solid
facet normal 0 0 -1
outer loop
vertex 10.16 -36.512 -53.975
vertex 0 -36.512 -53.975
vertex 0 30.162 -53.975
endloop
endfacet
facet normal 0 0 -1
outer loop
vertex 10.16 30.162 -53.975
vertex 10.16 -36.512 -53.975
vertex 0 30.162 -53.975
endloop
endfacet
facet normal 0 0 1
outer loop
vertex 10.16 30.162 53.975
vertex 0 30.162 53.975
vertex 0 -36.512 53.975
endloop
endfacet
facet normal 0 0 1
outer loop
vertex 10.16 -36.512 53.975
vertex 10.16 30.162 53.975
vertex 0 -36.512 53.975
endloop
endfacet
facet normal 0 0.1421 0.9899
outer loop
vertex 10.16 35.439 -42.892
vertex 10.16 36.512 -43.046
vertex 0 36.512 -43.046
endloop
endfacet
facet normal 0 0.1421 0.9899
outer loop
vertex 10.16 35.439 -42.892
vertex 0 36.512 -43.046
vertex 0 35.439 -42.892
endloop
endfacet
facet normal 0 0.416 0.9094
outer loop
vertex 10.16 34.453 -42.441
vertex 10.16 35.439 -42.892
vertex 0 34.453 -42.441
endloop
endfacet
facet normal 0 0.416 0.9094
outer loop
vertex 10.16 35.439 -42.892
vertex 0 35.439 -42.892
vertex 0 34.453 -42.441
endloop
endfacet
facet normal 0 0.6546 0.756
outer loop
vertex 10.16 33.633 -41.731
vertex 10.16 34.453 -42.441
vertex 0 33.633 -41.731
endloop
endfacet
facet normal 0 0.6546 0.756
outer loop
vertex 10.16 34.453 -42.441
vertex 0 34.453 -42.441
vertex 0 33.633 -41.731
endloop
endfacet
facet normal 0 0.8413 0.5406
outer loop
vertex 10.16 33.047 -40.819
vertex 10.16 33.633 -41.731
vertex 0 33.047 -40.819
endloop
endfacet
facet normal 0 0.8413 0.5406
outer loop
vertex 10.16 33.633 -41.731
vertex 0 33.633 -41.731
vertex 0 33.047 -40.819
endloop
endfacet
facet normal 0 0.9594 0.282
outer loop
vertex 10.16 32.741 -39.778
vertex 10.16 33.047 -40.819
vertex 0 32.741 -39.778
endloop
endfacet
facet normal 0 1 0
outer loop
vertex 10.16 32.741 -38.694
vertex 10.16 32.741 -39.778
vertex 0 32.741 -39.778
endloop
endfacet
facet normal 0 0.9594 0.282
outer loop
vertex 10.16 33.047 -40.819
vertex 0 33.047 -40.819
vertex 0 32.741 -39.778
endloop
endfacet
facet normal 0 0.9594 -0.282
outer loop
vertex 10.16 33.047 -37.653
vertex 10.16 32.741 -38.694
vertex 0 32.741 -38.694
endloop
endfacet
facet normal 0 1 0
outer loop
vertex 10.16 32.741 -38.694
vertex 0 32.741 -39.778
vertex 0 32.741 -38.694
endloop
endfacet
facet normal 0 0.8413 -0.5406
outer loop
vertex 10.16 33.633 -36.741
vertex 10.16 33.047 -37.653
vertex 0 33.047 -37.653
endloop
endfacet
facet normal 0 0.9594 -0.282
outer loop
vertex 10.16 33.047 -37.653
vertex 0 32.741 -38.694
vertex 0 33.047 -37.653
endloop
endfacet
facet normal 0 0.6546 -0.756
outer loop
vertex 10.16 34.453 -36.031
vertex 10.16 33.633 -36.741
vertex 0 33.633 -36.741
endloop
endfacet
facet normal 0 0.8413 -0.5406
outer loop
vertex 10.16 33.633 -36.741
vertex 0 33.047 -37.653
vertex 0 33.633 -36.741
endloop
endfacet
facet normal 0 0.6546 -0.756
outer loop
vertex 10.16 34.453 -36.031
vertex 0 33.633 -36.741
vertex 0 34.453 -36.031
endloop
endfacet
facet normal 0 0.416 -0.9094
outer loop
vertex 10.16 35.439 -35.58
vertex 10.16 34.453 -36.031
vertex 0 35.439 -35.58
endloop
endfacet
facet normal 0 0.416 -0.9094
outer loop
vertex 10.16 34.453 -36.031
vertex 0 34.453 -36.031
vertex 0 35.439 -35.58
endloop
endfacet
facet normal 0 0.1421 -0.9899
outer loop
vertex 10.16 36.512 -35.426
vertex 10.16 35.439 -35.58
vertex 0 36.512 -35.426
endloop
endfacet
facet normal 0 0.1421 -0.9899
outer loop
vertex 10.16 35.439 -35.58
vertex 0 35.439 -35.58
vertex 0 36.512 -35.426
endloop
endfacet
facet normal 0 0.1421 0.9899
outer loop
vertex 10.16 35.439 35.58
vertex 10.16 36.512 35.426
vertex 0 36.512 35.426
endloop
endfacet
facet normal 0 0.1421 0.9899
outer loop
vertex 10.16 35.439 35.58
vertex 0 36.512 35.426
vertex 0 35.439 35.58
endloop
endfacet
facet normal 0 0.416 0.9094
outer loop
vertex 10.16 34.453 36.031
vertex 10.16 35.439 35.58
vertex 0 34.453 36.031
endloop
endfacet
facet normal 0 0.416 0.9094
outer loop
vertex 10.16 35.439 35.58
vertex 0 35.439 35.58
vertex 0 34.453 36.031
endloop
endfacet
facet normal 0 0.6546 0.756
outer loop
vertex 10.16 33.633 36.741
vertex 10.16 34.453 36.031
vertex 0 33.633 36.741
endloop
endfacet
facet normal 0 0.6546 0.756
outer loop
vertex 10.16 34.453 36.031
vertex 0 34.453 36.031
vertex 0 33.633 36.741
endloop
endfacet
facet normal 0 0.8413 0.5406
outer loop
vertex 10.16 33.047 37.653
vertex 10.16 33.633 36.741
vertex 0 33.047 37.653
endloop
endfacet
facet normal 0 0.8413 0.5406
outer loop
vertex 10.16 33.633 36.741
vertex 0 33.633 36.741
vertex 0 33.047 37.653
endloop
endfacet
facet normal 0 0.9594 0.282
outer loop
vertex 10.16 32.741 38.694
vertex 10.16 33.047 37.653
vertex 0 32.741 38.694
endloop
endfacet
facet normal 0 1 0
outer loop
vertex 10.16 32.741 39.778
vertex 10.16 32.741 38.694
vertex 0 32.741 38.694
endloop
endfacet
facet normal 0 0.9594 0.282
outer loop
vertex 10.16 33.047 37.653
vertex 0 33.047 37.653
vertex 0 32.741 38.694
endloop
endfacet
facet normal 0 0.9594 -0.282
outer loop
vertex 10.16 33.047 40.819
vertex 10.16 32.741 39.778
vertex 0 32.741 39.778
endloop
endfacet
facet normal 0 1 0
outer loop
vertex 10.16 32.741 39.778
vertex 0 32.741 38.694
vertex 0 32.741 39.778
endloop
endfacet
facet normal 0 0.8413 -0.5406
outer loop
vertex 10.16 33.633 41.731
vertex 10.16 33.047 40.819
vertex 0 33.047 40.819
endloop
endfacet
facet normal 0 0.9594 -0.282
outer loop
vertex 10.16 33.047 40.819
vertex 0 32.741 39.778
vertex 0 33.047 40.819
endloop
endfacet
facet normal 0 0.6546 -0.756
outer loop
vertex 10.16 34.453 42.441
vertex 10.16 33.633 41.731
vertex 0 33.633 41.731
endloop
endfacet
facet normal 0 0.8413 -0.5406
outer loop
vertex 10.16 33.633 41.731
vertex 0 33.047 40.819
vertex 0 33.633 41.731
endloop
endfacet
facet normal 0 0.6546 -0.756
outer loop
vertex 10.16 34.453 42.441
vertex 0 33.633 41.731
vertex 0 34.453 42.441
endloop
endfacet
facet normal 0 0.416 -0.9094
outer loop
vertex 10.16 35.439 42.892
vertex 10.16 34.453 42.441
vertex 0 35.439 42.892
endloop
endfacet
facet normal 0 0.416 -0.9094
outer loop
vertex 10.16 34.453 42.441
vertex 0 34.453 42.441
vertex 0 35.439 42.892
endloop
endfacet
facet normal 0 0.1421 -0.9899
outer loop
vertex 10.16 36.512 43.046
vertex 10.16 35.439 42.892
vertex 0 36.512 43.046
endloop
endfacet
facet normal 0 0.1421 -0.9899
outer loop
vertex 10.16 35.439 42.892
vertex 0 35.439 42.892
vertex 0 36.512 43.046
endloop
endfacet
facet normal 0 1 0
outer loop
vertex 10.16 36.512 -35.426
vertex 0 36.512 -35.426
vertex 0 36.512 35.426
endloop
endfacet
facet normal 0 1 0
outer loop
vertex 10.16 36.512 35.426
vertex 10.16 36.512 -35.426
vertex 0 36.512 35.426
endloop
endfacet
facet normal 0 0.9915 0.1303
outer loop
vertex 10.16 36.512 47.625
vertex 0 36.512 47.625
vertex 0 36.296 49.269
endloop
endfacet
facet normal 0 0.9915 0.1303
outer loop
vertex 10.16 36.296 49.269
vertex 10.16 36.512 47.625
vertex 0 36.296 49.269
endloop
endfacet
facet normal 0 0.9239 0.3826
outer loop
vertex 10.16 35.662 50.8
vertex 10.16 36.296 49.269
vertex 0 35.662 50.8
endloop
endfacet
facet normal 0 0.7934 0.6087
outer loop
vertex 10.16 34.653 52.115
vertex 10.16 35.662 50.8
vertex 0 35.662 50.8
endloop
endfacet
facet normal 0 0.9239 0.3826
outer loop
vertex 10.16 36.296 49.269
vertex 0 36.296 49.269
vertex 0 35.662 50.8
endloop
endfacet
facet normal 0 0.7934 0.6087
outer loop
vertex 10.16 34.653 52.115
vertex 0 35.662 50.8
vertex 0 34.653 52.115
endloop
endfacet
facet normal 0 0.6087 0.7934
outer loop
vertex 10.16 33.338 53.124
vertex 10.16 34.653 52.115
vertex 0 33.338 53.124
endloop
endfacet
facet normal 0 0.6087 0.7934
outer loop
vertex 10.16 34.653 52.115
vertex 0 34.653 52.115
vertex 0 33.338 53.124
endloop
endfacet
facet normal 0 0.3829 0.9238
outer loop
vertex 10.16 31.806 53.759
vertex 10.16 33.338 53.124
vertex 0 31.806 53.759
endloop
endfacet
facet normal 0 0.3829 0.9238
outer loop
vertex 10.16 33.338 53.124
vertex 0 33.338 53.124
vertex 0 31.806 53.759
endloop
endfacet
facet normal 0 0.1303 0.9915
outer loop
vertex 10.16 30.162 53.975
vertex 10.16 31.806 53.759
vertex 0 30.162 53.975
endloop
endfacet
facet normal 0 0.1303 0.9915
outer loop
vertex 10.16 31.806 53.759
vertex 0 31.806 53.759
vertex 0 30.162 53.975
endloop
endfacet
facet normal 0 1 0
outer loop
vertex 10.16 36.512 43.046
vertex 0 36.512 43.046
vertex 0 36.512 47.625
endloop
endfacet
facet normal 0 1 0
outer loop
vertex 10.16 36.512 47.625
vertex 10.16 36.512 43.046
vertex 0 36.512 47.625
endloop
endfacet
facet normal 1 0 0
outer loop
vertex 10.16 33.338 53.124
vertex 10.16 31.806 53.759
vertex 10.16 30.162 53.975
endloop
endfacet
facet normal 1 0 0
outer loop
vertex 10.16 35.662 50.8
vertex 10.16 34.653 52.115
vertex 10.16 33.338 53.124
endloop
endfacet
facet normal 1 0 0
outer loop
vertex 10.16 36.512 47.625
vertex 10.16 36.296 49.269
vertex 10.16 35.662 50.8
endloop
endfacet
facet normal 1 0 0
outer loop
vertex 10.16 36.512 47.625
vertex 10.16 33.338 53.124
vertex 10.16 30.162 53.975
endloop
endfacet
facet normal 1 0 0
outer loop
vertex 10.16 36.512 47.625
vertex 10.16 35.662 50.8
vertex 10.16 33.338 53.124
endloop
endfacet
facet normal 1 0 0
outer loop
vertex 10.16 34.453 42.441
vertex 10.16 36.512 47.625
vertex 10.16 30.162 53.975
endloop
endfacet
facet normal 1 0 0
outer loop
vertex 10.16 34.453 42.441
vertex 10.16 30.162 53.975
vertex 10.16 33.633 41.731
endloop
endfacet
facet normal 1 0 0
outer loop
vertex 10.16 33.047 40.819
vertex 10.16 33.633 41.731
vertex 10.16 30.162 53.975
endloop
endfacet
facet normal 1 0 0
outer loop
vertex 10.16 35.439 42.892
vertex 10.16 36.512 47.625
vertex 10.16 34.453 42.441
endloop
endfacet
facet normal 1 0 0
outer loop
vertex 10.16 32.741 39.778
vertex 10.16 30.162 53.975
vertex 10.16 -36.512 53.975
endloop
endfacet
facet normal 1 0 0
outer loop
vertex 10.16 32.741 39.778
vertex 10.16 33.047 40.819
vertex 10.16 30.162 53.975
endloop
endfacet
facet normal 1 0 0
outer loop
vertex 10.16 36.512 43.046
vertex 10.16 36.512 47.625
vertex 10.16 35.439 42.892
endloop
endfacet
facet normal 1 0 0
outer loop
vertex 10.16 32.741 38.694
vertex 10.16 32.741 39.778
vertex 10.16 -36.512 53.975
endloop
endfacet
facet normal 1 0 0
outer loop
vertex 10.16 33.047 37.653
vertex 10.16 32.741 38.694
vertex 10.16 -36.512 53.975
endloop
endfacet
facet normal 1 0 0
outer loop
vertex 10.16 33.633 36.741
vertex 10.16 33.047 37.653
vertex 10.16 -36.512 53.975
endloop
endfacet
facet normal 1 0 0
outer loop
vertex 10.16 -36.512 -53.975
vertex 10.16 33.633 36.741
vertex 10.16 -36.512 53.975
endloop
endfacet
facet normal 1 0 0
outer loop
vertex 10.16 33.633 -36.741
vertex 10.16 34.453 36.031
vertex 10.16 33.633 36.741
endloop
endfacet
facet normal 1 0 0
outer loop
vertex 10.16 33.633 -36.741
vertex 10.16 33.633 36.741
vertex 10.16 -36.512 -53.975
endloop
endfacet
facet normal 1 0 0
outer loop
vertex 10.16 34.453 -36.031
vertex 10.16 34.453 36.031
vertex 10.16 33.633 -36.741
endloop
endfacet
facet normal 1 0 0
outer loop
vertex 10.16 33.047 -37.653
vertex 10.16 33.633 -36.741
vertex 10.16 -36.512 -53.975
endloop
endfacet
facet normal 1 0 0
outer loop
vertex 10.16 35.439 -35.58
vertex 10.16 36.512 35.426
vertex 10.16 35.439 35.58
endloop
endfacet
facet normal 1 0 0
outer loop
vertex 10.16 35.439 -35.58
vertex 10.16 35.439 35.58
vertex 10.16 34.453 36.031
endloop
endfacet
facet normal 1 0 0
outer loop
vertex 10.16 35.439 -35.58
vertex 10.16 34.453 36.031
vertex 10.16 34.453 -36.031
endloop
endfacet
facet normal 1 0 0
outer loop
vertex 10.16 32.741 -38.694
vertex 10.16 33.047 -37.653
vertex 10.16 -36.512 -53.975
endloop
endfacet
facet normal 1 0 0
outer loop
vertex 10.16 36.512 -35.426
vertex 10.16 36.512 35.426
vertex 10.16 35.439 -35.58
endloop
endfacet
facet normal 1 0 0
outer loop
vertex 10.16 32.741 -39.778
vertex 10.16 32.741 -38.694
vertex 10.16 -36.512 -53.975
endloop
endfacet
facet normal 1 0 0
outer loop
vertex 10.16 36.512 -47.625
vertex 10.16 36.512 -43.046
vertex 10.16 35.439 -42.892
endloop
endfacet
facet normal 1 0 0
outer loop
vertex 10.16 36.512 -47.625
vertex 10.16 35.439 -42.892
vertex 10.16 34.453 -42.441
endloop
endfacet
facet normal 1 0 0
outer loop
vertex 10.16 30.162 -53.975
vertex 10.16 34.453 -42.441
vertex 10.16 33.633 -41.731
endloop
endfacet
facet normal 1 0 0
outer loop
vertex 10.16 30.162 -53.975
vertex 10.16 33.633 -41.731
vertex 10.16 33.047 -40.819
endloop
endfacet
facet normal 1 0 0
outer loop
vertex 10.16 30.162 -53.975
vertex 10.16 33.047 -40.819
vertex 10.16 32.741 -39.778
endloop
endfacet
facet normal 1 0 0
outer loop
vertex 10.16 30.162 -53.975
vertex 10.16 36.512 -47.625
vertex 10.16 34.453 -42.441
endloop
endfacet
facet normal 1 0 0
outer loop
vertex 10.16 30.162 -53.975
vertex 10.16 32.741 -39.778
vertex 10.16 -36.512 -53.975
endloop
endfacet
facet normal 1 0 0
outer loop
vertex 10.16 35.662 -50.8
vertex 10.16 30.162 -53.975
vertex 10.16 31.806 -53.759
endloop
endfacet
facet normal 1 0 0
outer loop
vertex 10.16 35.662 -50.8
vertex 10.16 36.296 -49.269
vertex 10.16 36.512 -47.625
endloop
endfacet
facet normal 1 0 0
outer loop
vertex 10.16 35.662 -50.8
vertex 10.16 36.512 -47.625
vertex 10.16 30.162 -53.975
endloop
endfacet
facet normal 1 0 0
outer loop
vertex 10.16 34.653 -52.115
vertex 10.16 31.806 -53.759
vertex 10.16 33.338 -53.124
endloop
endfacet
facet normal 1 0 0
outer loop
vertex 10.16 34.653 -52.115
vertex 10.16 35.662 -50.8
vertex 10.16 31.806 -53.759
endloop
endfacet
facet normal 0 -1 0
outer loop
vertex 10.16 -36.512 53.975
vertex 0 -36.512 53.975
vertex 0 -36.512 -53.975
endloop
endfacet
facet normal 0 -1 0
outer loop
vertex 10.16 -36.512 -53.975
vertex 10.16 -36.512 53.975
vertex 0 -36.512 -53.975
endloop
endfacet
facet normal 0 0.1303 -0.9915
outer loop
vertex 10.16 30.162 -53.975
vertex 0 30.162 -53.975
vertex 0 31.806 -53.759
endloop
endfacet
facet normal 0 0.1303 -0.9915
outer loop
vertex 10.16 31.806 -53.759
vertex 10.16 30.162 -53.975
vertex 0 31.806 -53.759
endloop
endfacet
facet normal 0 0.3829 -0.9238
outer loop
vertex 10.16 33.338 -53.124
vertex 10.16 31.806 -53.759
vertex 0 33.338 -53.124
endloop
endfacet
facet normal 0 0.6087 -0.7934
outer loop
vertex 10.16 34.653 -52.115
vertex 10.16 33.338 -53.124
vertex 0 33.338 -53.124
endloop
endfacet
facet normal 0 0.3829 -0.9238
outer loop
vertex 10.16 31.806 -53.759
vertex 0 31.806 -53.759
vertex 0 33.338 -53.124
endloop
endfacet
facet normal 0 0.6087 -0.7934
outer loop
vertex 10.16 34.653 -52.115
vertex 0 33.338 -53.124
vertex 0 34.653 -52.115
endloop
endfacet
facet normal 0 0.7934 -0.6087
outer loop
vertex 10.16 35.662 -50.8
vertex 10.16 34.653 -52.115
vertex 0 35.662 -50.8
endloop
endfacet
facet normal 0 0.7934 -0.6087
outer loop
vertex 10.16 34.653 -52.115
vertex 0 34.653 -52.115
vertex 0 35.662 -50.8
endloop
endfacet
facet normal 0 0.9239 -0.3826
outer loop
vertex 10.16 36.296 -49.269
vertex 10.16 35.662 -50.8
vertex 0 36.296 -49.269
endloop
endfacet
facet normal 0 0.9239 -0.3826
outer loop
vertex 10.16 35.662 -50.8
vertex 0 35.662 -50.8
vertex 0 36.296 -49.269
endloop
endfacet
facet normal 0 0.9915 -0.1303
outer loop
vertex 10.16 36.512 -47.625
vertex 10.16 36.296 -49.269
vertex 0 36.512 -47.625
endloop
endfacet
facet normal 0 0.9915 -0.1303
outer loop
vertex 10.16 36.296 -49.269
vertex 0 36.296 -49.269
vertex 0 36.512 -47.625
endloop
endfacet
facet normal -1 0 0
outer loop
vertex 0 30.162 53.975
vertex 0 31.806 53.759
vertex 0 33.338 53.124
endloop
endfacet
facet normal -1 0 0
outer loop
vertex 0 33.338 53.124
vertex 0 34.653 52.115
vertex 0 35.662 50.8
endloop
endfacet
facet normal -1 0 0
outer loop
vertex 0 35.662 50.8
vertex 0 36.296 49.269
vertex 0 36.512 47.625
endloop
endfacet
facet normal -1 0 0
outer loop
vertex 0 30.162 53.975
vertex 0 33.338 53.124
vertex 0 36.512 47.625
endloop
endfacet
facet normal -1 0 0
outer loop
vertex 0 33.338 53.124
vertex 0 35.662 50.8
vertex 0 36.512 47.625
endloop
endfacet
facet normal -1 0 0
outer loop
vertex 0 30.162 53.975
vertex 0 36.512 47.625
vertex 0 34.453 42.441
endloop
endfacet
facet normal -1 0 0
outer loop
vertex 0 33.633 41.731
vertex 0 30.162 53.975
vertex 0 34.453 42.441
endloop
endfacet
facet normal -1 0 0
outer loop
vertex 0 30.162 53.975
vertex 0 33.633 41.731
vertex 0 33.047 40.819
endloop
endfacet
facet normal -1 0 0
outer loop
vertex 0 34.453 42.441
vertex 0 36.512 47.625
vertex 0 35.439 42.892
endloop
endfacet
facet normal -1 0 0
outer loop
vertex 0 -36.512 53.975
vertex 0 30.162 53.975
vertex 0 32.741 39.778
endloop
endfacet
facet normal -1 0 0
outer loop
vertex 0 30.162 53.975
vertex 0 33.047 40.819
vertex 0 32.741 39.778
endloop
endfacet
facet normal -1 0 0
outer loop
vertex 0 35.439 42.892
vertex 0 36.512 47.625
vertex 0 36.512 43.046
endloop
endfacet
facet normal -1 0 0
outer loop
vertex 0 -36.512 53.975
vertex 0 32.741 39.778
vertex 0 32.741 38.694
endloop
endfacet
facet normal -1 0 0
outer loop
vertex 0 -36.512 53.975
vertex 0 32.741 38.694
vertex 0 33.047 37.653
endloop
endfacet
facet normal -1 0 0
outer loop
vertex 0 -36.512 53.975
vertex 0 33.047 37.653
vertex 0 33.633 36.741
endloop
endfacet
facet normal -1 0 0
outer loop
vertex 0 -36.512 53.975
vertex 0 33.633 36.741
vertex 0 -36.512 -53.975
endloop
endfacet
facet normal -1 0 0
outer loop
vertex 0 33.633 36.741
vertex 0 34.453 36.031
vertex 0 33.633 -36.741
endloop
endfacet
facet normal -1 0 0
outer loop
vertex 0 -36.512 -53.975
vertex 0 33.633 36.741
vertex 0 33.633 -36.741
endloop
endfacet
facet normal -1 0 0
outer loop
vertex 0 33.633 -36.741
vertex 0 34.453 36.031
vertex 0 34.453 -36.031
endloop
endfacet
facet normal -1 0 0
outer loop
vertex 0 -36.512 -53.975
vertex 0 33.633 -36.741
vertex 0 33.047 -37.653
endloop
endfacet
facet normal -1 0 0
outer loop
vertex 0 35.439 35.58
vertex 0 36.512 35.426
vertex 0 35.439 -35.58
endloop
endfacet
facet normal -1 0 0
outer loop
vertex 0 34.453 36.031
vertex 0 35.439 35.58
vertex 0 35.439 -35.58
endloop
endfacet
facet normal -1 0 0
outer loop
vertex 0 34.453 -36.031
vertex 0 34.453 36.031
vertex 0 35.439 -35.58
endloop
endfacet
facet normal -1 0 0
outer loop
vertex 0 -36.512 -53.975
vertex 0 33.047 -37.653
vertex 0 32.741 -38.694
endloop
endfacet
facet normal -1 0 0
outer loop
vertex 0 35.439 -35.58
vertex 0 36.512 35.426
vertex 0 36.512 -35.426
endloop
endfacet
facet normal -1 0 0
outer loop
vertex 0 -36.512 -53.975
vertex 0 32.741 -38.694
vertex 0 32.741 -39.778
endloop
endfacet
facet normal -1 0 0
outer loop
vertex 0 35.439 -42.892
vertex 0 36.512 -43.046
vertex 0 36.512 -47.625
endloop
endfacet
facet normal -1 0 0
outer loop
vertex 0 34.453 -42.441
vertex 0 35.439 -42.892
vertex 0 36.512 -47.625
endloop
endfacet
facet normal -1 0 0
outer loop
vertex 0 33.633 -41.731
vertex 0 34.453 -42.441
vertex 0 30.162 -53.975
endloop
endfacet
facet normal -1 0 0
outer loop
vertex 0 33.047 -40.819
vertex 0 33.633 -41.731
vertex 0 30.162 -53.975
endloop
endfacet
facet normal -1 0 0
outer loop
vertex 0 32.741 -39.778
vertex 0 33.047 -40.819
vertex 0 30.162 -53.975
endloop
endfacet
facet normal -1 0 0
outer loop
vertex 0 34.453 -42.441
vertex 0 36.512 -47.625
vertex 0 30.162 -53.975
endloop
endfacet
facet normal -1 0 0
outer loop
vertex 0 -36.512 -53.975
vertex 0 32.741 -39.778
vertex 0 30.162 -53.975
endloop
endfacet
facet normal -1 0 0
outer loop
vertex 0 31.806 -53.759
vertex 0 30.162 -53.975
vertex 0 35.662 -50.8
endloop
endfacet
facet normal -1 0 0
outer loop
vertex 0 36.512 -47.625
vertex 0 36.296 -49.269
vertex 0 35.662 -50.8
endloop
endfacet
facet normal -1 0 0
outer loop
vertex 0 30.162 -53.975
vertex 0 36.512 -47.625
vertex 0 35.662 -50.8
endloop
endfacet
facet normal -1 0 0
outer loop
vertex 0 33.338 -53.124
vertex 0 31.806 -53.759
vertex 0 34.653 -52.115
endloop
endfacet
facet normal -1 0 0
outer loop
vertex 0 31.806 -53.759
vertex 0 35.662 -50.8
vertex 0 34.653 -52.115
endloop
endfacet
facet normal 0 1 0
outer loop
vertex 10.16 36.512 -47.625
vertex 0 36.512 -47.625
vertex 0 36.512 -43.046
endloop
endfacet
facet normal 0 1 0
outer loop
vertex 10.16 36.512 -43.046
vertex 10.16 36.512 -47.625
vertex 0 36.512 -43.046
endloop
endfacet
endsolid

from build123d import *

# Parameters (mm, degrees)
BOSS_EXTRUDE1_DEPTH = 10.16


with BuildPart() as part:
    # Sketch1 → Boss-Extrude1 (new body)
    with BuildSketch(Plane(origin=(0, 0, 0), x_dir=(0, 0, -1), z_dir=(1, 0, 0))):
        with BuildLine():
            Line((-53.975, -36.5125), (53.975, -36.5125))
            Line((53.975, -36.5125), (53.975, 30.1625))
            ThreePointArc((53.975, 30.1625), (52.115128061, 34.652628061), (47.625, 36.5125))
            Line((47.625, 36.5125), (43.045928132, 36.5125))
            ThreePointArc((43.045928132, 36.5125), (39.235928132, 32.7025), (35.425928132, 36.5125))
            Line((35.425928132, 36.5125), (-35.425928132, 36.5125))
            ThreePointArc((-35.425928132, 36.5125), (-39.235928132, 32.7025), (-43.045928132, 36.5125))
            Line((-43.045928132, 36.5125), (-47.625, 36.5125))
            ThreePointArc((-47.625, 36.5125), (-52.115128061, 34.652628061), (-53.975, 30.1625))
            Line((-53.975, 30.1625), (-53.975, -36.5125))
        make_face()
    extrude(amount=BOSS_EXTRUDE1_DEPTH)


solid = part.part
